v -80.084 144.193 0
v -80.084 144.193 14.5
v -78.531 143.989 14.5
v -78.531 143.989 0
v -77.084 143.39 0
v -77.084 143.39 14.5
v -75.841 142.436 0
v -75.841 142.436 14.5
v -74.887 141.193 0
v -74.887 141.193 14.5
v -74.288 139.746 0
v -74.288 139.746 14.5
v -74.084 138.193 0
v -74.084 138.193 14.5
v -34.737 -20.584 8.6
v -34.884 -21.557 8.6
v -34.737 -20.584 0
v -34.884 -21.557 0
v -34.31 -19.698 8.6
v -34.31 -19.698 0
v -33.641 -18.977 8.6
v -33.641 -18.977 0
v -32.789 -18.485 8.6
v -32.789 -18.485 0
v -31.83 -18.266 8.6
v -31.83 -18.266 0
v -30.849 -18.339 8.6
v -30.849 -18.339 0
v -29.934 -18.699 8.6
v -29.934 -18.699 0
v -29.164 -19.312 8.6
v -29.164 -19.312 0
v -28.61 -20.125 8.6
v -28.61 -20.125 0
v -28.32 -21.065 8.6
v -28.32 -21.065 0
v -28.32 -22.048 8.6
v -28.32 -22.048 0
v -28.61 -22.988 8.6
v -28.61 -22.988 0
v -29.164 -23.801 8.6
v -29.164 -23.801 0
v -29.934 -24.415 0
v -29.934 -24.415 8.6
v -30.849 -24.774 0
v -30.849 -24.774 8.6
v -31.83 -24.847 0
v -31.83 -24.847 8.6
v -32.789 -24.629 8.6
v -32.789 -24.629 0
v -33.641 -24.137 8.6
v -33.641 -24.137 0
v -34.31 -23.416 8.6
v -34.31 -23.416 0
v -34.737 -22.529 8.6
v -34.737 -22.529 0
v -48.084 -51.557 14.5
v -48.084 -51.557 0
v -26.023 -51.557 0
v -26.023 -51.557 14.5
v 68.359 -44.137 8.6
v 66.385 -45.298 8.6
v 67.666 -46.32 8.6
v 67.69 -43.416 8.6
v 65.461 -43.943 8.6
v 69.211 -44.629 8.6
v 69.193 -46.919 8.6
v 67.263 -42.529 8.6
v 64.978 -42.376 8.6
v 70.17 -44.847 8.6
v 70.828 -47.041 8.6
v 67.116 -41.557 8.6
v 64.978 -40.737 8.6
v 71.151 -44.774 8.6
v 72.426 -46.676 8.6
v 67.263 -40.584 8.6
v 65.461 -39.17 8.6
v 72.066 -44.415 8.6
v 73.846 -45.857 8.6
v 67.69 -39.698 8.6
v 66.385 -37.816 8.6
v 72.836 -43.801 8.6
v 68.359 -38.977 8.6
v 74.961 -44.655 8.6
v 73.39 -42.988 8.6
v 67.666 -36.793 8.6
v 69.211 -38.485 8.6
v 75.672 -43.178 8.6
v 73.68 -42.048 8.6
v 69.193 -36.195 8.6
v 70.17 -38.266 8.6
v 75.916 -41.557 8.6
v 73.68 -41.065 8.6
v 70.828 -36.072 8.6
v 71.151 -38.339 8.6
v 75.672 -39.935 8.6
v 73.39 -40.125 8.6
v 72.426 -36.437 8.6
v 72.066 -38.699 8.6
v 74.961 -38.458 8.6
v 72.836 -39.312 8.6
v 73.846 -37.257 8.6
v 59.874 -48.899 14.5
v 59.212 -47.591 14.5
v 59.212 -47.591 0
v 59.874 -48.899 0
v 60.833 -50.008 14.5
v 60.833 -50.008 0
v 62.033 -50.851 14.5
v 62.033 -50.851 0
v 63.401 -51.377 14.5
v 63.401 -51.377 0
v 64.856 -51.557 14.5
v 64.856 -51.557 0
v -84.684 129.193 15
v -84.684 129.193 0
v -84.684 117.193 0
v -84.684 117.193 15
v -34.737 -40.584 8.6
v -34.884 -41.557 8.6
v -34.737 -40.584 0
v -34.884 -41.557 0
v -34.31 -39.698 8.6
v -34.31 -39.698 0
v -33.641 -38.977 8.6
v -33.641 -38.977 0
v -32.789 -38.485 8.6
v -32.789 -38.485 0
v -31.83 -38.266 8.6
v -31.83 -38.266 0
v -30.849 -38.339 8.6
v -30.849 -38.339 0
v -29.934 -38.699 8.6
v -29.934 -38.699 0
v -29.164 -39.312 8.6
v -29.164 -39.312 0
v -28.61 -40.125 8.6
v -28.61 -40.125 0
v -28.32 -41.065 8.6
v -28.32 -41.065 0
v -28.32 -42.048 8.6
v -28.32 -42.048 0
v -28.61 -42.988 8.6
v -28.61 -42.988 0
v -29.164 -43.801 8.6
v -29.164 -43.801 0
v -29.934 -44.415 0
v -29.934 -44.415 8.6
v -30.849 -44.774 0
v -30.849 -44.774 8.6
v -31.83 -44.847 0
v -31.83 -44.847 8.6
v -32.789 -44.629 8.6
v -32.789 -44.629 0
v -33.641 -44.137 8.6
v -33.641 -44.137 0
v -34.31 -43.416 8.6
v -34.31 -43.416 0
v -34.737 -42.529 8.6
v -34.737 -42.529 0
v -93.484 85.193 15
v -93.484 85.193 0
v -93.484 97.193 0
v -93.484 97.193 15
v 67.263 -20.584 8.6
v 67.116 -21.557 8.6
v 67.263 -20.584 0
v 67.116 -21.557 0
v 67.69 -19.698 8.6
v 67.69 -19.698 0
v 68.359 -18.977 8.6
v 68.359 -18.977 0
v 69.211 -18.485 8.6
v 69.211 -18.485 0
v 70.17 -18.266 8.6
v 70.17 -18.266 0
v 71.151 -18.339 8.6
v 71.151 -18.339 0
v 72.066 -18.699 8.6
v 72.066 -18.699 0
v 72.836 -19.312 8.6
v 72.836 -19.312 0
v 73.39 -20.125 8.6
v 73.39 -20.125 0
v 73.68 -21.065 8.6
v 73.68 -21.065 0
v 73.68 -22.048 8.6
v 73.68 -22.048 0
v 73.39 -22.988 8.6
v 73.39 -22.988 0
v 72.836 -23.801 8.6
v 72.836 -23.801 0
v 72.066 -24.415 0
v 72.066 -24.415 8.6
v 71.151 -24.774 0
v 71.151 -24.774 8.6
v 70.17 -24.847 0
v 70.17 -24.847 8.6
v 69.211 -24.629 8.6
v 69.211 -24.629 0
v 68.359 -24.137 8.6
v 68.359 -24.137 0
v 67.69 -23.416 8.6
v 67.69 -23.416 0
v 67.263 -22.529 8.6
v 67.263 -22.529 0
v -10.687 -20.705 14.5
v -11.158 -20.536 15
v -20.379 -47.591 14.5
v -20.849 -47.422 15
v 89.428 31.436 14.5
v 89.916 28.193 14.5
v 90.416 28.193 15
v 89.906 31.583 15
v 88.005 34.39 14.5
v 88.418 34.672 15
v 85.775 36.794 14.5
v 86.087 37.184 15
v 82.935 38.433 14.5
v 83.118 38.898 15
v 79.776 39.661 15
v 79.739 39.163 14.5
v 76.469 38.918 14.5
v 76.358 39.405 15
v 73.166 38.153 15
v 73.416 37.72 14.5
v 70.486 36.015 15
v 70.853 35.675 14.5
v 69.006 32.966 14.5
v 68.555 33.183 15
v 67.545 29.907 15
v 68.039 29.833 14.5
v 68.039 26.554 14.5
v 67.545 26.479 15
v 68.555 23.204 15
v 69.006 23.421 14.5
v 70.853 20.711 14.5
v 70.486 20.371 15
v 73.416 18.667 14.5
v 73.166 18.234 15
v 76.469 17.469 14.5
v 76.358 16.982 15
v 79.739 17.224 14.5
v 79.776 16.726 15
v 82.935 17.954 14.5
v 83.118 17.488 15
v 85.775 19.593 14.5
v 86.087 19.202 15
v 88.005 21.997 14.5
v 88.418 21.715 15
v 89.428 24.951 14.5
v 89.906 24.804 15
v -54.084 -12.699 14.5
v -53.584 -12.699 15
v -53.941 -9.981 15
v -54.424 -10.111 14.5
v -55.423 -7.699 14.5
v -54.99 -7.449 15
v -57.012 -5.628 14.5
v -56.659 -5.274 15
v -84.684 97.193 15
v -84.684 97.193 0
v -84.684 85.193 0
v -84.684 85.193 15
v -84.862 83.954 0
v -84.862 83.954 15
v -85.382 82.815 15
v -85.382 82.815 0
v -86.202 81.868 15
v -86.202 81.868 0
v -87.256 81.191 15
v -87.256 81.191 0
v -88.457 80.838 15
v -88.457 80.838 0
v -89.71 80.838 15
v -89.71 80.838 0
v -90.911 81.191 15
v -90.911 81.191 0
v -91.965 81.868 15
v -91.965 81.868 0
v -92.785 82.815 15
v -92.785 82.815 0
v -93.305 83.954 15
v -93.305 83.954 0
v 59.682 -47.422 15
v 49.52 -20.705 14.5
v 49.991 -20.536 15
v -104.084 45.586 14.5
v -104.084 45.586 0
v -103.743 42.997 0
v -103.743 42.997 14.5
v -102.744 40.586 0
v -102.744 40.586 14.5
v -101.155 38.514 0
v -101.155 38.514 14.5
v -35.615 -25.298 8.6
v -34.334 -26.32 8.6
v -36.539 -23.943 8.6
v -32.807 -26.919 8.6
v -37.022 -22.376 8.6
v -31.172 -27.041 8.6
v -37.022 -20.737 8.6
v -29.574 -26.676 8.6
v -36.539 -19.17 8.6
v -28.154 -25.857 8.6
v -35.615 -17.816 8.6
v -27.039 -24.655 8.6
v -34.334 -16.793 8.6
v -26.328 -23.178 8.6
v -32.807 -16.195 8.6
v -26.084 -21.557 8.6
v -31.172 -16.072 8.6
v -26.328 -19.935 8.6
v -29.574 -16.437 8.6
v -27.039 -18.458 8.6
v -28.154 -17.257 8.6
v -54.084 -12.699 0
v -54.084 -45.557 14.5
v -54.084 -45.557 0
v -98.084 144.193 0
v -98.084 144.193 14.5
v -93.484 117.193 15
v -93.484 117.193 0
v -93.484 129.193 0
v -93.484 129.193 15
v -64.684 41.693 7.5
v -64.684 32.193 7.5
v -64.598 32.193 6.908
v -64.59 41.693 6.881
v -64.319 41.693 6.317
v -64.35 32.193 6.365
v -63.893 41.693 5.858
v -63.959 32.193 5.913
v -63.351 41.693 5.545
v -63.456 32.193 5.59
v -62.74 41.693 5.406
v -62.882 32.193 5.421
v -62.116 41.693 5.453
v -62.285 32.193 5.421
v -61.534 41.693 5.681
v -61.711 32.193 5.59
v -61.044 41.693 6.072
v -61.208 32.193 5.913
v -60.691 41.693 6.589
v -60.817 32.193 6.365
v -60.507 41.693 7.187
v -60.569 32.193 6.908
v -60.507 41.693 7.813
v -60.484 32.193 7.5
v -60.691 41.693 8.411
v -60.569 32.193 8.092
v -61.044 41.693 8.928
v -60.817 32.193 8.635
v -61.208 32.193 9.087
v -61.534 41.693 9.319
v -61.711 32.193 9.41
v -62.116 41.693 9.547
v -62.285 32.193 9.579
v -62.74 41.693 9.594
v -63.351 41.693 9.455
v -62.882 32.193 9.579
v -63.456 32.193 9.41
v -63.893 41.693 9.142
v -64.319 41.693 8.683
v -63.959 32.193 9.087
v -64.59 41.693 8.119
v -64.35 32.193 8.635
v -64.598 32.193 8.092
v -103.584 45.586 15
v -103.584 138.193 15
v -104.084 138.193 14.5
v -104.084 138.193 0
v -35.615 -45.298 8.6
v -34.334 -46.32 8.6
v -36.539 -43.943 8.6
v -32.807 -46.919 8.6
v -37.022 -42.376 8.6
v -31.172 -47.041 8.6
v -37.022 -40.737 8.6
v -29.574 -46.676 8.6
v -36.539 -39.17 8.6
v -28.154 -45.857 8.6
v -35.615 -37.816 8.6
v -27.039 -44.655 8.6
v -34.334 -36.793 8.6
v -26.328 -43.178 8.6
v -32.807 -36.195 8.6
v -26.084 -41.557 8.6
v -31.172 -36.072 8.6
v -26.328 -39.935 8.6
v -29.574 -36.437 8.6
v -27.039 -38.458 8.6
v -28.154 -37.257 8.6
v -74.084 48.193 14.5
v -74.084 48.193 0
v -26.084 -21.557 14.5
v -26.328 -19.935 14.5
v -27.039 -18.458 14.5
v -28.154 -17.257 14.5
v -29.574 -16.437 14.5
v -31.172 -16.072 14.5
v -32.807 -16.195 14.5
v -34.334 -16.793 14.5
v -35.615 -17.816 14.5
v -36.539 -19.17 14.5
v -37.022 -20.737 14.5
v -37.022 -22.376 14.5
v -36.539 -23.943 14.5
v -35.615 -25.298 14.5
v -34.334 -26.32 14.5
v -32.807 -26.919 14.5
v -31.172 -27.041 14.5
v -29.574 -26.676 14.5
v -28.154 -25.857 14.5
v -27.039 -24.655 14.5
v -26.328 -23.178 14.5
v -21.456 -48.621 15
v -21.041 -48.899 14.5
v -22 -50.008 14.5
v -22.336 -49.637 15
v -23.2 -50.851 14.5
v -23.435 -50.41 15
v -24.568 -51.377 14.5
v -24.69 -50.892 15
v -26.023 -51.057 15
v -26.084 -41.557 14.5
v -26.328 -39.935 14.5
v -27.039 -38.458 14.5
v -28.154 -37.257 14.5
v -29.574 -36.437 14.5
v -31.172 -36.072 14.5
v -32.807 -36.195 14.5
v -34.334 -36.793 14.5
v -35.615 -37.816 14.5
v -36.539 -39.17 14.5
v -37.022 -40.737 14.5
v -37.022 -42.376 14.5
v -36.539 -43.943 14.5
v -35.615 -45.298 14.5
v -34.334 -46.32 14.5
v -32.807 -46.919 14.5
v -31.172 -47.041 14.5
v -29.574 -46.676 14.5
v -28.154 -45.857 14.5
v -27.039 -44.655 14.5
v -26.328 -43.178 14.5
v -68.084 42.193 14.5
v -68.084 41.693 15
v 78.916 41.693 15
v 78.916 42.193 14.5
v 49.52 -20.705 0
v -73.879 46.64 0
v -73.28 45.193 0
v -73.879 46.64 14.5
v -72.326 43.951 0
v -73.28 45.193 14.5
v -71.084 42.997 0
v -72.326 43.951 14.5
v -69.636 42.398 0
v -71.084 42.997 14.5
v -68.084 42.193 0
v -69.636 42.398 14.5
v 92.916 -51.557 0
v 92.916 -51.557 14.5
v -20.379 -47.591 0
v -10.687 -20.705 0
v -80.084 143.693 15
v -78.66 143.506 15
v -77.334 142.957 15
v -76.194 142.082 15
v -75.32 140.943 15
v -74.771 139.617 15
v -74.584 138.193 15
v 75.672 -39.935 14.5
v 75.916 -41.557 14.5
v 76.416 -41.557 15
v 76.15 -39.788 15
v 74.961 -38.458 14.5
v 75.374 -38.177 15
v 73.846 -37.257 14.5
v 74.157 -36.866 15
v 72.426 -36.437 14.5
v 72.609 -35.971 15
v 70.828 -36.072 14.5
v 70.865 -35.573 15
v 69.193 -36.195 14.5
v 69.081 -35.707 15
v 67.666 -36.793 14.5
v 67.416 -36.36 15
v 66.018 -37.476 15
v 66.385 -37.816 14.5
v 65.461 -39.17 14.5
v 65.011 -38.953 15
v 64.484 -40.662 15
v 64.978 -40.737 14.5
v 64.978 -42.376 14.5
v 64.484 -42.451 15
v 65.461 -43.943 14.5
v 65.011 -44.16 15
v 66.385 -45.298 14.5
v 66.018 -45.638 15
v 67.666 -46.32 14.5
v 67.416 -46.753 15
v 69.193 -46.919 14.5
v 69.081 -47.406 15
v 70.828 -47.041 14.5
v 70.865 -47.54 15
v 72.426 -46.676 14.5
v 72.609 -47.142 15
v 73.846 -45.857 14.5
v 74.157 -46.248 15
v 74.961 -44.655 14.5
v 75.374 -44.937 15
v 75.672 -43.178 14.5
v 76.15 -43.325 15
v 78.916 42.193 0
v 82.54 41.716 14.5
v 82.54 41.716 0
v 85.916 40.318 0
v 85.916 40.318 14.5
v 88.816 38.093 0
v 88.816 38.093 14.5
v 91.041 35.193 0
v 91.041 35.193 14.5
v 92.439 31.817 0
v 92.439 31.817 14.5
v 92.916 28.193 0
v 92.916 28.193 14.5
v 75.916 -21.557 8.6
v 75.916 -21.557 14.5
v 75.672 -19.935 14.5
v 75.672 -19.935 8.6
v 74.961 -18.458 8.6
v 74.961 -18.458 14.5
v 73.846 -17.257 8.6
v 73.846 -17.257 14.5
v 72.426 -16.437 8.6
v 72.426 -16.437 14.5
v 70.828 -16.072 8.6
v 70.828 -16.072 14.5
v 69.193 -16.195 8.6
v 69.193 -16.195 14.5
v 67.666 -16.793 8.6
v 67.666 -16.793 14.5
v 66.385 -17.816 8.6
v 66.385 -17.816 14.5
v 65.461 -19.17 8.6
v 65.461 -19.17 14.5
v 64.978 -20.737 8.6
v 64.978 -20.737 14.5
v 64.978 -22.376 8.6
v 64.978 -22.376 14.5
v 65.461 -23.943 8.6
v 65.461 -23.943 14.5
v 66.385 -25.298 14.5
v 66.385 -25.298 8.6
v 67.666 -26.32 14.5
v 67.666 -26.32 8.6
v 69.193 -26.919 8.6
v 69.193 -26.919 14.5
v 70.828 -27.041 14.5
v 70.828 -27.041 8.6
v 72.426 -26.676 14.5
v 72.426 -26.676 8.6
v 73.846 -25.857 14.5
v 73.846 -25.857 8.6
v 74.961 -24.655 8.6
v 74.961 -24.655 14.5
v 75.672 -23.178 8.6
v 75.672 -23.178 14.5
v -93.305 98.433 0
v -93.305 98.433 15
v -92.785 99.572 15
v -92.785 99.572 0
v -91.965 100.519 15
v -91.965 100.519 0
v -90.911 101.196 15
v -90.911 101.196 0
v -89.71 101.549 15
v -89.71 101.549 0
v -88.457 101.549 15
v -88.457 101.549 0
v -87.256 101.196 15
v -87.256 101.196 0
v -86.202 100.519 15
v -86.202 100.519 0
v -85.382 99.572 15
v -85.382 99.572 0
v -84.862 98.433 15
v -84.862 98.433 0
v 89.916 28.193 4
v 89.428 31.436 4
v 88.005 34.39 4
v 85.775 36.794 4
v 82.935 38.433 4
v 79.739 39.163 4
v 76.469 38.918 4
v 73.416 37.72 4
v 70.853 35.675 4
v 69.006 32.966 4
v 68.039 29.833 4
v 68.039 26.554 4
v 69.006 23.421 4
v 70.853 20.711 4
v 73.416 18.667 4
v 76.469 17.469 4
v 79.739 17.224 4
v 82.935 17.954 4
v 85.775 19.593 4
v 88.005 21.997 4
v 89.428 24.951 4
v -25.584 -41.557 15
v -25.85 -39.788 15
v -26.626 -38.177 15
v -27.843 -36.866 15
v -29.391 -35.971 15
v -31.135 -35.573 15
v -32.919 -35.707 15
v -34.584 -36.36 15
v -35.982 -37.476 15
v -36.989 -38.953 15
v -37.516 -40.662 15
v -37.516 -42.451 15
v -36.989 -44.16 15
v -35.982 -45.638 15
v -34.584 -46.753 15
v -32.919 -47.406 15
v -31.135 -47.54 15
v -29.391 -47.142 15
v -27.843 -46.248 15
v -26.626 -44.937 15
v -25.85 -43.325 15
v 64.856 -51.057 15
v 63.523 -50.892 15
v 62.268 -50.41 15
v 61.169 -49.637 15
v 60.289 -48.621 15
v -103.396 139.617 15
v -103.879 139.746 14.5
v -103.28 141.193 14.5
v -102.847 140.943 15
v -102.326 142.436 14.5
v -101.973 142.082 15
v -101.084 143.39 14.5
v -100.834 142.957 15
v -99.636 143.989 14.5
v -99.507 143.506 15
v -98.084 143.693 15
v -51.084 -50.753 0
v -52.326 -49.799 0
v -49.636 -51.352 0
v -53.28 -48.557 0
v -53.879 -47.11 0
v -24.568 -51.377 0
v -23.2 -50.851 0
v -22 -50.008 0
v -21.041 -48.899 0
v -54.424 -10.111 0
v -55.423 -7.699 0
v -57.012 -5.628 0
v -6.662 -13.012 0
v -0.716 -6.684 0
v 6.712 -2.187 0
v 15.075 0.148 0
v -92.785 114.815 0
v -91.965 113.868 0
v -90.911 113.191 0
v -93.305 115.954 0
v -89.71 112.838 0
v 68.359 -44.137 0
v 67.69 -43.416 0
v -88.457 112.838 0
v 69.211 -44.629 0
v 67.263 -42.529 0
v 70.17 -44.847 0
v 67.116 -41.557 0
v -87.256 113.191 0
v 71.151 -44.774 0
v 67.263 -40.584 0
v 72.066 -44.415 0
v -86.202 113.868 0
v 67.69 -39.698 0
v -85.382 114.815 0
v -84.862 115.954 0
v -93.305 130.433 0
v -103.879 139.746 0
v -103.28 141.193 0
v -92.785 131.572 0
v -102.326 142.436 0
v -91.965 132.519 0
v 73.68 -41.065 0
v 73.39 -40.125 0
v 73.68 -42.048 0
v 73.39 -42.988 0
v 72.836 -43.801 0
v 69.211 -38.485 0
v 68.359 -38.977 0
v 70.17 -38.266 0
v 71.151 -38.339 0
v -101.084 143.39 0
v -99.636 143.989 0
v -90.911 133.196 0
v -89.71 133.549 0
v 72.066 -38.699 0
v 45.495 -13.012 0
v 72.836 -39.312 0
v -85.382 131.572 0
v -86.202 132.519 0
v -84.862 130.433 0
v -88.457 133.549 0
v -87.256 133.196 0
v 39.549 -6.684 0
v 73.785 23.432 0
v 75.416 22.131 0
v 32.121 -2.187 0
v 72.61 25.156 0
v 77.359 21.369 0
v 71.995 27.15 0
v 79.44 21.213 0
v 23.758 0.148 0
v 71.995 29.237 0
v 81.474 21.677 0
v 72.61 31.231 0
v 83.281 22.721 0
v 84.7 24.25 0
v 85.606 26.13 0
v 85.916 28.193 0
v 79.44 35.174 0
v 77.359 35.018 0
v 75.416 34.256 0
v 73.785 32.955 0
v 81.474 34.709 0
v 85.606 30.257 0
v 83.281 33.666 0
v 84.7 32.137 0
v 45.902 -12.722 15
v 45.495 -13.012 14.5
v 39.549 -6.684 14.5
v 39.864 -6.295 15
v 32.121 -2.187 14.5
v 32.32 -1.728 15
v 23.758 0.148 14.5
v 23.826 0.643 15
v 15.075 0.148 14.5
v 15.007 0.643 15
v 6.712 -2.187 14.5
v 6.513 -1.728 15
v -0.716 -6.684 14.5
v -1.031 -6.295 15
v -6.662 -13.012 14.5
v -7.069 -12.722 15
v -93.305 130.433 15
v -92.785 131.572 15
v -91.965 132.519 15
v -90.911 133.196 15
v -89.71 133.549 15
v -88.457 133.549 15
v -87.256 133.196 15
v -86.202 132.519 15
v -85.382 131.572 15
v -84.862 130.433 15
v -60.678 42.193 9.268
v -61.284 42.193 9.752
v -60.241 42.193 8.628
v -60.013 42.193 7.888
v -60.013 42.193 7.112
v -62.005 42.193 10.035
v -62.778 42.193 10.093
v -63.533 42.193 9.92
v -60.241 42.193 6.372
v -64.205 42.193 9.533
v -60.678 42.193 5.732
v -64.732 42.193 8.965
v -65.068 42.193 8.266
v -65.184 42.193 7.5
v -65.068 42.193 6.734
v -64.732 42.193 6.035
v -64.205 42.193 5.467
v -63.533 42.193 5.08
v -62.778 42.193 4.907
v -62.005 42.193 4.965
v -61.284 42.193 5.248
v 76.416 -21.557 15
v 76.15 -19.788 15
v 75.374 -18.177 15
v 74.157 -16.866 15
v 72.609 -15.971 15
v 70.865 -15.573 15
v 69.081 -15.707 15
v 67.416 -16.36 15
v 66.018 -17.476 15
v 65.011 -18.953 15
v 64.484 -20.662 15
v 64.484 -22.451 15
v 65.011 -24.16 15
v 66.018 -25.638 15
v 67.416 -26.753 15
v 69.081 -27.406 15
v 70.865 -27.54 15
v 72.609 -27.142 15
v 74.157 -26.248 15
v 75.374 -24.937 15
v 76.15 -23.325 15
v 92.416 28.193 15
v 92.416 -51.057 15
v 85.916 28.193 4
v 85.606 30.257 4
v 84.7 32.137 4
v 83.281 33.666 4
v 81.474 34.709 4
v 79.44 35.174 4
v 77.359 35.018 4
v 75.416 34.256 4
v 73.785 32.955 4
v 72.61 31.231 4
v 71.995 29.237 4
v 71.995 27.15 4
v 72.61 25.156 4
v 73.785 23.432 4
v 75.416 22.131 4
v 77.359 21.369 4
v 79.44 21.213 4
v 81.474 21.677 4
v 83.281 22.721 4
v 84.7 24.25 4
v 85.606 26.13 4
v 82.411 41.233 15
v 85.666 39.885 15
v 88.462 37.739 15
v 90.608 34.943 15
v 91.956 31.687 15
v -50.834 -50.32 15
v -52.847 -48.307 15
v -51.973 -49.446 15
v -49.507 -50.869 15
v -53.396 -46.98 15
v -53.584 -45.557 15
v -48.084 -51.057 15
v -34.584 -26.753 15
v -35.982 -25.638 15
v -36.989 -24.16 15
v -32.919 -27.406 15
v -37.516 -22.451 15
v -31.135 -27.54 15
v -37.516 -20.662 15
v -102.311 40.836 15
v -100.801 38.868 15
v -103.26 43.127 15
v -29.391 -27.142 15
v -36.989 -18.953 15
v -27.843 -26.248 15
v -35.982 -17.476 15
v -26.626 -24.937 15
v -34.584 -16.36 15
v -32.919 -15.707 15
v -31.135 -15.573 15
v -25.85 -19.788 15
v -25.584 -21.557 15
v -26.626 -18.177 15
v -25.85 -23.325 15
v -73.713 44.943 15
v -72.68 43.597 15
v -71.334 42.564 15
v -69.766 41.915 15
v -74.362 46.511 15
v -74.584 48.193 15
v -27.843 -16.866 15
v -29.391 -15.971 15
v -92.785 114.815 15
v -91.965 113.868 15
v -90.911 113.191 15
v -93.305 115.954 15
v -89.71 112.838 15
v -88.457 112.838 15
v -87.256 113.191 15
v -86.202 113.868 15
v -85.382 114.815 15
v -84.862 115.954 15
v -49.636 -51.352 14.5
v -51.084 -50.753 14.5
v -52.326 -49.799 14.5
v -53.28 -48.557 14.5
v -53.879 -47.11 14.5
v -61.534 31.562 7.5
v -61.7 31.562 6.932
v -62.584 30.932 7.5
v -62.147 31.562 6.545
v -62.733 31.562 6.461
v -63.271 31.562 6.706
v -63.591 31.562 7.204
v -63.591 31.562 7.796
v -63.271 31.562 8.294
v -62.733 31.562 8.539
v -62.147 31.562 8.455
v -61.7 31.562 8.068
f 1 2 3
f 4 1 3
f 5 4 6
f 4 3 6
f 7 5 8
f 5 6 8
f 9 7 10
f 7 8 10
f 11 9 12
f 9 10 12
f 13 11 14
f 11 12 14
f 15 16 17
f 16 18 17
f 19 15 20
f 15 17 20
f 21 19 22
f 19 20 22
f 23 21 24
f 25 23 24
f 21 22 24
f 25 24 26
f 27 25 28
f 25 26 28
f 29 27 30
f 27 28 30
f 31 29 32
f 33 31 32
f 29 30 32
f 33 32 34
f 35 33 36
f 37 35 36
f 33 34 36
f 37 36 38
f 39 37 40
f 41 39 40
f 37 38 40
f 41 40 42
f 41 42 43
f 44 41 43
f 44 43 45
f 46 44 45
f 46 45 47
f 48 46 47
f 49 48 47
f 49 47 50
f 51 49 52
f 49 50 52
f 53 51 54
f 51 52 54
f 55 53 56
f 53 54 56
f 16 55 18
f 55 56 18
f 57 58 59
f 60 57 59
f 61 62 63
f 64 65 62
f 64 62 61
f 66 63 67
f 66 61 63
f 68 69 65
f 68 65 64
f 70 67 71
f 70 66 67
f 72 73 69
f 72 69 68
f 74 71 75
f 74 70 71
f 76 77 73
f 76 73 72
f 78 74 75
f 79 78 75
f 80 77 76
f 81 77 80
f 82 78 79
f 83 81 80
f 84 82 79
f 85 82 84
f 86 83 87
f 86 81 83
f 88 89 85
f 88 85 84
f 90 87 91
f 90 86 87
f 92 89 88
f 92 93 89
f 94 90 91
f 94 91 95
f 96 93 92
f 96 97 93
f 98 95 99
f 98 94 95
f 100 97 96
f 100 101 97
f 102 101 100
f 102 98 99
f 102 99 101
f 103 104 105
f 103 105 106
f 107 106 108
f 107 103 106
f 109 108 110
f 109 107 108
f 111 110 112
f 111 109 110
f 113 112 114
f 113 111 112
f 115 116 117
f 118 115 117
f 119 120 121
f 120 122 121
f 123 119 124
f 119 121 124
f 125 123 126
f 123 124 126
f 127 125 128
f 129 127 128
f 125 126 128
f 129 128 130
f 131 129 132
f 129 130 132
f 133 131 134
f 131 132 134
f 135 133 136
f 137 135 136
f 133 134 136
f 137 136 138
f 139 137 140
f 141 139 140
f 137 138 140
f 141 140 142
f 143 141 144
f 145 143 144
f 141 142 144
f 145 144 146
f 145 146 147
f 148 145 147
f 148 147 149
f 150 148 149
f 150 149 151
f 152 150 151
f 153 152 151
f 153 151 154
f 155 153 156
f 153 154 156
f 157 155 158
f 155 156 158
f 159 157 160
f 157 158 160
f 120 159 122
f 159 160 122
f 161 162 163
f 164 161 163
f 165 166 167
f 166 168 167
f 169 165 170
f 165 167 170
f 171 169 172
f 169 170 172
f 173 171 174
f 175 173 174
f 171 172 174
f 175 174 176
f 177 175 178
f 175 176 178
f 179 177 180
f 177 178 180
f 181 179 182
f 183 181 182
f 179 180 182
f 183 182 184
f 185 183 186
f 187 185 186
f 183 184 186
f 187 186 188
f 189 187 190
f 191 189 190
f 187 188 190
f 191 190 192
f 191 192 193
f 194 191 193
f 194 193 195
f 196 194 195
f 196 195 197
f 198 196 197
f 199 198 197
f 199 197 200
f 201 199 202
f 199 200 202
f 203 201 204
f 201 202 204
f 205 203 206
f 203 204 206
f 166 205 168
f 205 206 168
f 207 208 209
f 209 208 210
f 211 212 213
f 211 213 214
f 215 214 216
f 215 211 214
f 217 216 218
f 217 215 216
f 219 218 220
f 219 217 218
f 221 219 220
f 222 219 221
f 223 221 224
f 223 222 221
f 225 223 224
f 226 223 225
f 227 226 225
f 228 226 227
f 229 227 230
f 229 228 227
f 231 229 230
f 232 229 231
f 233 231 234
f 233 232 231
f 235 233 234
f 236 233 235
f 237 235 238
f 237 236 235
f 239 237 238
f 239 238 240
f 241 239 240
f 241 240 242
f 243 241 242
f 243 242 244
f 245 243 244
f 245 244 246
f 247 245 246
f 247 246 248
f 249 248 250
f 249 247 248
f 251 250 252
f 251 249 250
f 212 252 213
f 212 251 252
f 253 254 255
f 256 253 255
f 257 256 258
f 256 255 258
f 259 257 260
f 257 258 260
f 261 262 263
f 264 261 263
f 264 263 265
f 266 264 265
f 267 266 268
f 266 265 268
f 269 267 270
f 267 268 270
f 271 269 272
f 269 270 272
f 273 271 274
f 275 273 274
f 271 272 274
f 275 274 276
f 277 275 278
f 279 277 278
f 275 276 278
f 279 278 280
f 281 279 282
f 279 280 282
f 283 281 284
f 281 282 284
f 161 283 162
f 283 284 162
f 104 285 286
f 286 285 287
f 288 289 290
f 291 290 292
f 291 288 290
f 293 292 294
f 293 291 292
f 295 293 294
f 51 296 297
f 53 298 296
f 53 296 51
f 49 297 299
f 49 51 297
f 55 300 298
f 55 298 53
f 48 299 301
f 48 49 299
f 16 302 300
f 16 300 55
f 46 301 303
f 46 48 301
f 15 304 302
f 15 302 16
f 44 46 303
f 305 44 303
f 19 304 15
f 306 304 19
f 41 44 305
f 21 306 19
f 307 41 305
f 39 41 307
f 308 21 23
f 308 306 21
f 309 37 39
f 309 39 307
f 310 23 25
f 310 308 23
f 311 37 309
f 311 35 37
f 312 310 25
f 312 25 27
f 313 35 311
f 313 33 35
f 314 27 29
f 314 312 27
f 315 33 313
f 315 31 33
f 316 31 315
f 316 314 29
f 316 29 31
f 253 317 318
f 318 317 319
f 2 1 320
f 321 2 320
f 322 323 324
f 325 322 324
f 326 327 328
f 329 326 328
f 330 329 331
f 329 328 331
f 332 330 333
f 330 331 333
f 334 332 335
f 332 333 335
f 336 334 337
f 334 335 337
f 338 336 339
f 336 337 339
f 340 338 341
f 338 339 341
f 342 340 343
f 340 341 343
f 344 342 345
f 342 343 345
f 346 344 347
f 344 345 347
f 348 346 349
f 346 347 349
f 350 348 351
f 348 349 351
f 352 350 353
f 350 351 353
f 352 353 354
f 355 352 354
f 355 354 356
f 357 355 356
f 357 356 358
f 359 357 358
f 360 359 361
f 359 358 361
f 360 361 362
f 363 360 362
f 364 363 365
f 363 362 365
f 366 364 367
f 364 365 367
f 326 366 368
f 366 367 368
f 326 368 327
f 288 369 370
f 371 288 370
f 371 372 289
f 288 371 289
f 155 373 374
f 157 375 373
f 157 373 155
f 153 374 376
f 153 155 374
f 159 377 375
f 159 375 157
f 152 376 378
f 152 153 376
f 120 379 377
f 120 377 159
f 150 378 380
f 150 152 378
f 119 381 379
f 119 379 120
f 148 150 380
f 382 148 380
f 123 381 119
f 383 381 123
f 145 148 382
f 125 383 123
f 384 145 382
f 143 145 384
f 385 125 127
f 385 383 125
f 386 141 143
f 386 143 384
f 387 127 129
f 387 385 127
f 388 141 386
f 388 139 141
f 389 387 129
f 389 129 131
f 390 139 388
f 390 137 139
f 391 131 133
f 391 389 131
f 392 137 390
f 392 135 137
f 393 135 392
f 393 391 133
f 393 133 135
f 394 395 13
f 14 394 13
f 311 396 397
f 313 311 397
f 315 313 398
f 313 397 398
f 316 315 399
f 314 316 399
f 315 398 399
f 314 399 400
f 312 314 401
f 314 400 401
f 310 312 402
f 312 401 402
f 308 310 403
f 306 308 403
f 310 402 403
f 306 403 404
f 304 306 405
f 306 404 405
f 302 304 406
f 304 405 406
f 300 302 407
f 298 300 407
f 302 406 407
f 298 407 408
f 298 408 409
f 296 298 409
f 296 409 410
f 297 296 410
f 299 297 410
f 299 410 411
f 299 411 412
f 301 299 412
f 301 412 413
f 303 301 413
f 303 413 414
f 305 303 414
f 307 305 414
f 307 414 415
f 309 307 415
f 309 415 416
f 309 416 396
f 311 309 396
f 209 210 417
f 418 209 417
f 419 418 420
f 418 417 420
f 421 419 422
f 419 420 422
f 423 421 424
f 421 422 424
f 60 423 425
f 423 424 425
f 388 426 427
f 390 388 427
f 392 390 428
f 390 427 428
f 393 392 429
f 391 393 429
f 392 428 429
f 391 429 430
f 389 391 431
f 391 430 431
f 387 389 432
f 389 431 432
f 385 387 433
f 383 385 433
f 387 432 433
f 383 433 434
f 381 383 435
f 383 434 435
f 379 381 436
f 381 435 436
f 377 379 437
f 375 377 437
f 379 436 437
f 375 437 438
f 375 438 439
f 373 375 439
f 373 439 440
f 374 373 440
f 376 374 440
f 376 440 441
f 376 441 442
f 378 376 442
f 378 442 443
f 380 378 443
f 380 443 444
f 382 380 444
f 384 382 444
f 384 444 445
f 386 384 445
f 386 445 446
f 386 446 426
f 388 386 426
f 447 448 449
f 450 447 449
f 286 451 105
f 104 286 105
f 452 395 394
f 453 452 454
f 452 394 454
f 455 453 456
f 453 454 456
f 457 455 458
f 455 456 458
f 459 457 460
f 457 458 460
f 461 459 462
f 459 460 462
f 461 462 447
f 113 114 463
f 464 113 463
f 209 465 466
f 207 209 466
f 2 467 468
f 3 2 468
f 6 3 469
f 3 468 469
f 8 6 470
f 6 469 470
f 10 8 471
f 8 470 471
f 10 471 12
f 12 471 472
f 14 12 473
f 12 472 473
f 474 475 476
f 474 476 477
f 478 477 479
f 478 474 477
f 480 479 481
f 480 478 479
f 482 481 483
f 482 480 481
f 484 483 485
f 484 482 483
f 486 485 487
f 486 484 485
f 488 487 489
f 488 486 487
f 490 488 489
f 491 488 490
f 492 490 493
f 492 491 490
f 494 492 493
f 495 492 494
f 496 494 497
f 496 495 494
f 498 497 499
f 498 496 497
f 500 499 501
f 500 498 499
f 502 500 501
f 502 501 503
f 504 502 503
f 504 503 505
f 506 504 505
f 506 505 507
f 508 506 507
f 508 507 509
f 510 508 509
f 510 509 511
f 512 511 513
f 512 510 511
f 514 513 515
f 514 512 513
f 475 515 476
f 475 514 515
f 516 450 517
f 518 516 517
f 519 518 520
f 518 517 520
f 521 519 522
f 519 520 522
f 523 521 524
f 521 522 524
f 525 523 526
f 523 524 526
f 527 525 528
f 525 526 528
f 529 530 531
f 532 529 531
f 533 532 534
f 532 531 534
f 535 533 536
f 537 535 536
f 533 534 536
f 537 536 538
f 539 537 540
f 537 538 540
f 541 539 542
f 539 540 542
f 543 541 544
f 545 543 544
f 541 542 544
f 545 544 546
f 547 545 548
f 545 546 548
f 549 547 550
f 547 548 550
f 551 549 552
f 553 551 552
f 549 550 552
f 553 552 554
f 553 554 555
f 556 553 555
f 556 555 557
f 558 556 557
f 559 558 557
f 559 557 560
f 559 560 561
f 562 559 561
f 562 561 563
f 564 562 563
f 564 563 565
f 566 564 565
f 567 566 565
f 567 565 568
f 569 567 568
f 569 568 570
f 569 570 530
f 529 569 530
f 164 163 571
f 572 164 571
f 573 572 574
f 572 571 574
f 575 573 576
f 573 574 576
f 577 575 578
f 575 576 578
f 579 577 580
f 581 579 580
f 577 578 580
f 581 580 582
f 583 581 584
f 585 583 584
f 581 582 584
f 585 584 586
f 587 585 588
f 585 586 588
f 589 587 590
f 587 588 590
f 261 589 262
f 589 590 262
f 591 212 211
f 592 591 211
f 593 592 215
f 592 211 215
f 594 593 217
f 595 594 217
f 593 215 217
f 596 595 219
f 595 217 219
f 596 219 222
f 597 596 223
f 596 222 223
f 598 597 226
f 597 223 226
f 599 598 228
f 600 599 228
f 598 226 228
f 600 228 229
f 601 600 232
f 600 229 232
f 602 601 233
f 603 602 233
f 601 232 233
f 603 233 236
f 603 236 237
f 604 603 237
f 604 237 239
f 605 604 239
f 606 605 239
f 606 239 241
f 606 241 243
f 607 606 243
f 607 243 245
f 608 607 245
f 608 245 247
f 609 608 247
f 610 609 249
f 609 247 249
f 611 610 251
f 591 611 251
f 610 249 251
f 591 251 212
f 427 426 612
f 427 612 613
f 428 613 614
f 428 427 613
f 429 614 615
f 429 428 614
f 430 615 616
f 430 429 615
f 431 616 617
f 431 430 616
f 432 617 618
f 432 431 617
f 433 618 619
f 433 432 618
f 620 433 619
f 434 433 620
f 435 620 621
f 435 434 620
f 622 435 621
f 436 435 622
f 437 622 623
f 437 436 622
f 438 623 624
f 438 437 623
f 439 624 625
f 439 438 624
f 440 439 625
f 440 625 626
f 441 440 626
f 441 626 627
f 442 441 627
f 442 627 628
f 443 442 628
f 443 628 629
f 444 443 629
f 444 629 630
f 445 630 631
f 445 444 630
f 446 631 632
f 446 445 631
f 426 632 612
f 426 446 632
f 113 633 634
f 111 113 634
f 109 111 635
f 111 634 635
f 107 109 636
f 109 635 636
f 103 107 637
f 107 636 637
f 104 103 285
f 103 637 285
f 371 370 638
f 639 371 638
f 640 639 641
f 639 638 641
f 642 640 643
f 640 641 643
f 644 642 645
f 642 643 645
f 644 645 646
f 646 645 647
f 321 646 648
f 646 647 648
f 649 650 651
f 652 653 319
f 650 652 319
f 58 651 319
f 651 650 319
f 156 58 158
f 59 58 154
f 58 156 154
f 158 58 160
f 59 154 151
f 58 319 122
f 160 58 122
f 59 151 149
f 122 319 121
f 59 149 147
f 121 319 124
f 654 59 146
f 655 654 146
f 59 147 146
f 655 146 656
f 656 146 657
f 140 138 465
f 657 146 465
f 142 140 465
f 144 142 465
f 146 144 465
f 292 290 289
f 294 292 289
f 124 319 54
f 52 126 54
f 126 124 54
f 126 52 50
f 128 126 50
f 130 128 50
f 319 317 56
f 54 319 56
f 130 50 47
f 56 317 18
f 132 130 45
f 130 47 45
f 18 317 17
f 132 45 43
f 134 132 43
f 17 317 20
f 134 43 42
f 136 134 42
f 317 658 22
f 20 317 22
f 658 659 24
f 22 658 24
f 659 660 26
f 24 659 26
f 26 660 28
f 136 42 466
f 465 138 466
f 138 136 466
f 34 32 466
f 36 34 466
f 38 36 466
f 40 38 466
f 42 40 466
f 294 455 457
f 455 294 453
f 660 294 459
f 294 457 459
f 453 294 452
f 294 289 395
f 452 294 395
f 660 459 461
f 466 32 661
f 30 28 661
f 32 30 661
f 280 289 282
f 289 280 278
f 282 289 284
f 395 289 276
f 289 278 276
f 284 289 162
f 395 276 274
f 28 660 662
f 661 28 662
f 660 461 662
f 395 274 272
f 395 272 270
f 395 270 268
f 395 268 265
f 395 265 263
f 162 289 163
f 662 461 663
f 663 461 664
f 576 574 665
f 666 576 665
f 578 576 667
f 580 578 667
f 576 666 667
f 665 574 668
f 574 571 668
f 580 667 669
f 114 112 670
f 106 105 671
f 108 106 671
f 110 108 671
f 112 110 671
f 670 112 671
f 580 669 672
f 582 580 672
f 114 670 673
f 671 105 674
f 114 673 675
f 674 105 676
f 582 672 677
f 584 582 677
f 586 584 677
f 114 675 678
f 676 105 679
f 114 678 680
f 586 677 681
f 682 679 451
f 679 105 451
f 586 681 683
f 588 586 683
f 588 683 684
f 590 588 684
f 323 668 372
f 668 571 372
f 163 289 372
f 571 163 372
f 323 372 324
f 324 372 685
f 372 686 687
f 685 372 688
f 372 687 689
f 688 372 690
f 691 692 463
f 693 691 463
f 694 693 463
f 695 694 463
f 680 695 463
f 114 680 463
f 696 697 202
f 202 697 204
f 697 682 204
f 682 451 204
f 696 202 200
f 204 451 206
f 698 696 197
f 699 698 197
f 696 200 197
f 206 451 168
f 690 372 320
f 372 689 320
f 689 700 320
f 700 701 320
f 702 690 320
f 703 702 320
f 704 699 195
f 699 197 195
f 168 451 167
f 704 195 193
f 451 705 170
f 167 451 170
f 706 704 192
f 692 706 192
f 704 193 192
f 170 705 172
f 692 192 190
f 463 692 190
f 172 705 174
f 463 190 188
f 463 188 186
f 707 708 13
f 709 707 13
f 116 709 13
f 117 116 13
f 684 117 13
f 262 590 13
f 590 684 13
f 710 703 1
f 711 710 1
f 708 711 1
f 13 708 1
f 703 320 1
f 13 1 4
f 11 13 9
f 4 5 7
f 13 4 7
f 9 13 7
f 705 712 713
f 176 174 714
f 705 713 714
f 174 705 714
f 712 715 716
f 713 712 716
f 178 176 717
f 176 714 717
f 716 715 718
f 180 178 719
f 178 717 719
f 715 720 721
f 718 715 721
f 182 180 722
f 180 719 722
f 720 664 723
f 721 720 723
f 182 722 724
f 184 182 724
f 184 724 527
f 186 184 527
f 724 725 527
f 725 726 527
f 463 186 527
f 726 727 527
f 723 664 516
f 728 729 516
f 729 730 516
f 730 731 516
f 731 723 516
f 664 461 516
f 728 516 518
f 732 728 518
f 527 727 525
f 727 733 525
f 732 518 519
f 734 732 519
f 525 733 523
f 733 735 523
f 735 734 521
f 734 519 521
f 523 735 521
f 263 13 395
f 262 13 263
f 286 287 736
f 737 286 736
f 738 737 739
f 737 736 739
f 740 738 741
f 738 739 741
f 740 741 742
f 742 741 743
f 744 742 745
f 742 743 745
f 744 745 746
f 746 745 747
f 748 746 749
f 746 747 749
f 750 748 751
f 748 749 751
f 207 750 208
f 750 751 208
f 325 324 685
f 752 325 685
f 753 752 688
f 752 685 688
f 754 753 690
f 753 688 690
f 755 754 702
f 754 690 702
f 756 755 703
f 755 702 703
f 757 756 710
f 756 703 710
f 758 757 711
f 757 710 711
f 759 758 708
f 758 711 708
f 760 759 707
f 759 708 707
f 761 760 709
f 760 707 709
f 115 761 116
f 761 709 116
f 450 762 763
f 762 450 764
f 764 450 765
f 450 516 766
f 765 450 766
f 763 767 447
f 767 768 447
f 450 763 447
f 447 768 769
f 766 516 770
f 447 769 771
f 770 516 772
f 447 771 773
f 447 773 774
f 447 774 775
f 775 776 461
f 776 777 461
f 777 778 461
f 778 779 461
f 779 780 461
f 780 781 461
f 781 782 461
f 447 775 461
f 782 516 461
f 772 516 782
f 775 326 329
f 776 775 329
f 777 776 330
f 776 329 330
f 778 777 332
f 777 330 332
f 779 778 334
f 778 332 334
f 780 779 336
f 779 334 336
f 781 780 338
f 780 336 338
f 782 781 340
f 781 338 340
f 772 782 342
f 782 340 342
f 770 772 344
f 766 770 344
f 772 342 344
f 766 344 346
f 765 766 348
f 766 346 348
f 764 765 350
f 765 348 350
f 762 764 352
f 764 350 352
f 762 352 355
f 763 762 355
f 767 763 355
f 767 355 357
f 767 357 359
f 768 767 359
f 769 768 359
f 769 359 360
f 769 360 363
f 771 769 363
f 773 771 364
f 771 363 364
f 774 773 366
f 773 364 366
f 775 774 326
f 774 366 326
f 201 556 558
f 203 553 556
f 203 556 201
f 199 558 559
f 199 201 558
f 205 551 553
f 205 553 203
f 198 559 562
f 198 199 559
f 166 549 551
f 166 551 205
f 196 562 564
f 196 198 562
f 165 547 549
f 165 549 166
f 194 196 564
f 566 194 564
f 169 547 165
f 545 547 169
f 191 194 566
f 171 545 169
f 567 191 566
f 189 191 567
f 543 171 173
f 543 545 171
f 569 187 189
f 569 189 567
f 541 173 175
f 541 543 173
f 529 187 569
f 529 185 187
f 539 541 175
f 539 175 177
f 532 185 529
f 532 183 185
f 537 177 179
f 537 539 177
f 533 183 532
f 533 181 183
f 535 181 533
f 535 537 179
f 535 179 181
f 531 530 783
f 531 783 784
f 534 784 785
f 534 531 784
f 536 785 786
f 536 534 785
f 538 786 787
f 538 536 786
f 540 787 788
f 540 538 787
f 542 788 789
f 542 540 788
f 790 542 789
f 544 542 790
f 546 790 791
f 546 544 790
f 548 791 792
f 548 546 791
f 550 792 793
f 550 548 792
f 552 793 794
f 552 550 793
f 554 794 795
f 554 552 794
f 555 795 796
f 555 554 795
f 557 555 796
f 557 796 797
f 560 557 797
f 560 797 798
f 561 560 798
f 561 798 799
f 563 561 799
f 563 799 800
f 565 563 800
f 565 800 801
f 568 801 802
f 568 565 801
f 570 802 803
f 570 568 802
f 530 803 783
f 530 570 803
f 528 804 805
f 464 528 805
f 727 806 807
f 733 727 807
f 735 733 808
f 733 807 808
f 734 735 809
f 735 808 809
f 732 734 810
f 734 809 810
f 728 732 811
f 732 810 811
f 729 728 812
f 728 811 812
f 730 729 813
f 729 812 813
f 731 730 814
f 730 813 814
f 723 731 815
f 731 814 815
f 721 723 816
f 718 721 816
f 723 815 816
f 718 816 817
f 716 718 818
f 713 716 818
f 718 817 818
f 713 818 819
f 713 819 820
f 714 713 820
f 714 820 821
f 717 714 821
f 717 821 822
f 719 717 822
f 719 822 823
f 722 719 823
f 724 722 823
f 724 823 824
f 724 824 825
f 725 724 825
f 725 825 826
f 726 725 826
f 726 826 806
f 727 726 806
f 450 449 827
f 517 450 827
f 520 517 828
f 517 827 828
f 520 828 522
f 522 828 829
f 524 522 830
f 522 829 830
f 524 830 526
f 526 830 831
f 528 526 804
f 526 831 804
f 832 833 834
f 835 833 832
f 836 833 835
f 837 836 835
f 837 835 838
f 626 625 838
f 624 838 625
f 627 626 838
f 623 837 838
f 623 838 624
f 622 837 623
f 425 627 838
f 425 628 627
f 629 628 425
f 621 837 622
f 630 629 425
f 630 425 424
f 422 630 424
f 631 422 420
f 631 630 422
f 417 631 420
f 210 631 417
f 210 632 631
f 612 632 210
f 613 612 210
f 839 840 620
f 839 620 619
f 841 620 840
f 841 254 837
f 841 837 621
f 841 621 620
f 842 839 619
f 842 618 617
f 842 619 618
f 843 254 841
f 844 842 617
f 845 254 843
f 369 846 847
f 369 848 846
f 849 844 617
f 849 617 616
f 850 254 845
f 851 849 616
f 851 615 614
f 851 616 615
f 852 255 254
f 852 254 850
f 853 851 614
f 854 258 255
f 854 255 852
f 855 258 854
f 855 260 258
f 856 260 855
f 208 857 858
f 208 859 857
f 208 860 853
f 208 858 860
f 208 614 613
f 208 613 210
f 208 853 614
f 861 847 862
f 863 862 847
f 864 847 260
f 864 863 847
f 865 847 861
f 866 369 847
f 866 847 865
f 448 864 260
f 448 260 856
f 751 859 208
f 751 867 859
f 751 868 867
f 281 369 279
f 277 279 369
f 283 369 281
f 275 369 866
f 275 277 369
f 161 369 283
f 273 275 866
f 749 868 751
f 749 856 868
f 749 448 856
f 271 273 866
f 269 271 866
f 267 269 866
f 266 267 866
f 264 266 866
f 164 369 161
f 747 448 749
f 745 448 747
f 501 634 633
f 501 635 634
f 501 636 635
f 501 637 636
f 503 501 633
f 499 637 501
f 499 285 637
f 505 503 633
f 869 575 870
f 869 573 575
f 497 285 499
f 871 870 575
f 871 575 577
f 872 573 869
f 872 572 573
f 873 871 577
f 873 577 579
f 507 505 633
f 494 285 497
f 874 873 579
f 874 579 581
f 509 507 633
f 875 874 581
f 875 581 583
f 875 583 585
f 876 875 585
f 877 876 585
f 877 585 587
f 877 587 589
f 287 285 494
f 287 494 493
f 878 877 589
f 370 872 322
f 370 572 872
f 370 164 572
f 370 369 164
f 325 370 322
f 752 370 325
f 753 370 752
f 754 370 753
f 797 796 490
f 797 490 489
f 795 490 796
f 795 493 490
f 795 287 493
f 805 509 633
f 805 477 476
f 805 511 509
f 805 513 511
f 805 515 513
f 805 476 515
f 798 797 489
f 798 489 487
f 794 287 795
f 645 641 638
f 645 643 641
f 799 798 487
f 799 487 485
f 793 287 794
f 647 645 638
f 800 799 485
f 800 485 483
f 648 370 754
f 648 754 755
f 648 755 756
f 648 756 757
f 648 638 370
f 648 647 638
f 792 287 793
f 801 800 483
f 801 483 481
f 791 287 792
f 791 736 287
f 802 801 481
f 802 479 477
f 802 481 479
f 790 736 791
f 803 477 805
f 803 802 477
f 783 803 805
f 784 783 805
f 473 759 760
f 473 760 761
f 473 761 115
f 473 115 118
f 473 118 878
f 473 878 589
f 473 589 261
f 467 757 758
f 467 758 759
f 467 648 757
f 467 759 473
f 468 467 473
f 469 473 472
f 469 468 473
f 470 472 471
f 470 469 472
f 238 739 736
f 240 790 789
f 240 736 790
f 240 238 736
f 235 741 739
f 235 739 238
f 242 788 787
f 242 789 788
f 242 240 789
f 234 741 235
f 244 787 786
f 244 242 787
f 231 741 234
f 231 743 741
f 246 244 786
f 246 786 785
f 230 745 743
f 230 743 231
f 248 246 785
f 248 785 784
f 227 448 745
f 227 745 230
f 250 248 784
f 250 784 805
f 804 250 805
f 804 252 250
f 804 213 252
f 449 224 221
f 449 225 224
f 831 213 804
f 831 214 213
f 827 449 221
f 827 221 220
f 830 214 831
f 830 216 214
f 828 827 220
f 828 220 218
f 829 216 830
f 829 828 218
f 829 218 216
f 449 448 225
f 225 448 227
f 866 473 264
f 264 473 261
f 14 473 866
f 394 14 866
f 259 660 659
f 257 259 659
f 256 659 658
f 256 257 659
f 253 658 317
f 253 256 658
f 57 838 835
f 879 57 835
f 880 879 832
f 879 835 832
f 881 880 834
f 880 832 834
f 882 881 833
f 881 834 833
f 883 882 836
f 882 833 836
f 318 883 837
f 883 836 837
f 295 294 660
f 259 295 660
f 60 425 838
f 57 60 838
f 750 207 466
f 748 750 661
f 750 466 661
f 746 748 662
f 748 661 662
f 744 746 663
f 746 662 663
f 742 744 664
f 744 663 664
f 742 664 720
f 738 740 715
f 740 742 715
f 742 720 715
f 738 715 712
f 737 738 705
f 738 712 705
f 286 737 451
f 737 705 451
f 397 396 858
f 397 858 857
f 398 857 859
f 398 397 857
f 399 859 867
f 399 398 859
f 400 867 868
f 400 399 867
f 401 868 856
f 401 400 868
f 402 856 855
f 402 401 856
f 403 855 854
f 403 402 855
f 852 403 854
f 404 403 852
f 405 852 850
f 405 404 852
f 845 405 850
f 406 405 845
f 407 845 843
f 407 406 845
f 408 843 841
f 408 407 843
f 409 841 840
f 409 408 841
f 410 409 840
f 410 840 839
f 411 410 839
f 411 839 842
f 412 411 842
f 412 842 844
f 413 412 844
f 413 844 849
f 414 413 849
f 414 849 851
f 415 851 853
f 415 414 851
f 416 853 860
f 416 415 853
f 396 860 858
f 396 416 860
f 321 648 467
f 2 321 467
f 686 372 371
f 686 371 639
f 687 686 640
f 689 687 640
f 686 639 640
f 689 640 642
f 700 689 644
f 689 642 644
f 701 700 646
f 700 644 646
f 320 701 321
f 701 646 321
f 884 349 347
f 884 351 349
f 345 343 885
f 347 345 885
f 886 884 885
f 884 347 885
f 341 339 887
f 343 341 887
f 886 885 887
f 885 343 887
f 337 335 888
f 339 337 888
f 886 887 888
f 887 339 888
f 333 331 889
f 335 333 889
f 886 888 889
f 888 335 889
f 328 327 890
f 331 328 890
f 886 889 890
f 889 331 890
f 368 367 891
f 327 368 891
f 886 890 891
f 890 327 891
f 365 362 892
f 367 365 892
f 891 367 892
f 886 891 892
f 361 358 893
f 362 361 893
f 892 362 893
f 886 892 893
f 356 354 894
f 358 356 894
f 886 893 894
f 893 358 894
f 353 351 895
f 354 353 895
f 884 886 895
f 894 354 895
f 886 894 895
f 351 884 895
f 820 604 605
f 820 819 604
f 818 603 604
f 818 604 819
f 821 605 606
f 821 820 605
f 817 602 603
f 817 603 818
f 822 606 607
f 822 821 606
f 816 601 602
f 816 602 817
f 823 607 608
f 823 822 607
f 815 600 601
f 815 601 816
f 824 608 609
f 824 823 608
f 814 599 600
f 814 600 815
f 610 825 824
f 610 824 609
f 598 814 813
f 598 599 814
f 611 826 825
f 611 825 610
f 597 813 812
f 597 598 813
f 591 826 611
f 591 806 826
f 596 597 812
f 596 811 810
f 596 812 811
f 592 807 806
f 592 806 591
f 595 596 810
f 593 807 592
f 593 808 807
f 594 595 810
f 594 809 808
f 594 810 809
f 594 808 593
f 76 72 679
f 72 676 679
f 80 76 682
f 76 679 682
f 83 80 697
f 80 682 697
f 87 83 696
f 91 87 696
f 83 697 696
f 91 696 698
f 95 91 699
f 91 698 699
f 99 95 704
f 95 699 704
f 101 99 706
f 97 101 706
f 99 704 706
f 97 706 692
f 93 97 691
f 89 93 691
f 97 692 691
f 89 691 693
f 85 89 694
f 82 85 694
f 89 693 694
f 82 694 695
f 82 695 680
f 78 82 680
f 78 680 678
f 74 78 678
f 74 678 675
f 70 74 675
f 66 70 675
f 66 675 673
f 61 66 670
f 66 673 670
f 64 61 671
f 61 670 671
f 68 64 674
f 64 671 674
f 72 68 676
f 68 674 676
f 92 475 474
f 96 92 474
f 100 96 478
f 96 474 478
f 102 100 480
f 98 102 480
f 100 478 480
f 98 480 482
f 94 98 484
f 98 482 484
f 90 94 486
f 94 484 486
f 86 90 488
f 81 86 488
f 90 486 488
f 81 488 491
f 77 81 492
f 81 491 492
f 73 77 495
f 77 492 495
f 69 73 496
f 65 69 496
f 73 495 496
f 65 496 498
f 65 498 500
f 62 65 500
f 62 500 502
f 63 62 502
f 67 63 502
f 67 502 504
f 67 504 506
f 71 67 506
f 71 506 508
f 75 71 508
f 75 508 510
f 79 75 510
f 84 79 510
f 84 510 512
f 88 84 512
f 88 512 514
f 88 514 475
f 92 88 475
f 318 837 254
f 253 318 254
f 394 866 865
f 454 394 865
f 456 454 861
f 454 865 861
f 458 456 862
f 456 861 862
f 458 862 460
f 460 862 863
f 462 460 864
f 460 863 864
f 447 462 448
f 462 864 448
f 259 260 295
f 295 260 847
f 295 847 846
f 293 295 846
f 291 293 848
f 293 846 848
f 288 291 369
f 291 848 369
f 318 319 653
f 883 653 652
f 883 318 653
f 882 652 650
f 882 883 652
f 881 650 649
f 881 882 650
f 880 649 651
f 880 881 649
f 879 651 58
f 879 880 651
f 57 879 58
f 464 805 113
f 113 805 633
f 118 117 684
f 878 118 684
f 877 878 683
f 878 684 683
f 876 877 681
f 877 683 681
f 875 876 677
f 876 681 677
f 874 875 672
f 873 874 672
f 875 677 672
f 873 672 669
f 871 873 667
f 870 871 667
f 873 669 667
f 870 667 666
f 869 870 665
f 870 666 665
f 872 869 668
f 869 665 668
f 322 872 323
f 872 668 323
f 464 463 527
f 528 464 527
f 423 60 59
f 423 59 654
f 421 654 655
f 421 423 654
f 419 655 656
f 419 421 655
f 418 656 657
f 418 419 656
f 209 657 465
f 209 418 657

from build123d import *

# Parameters (mm, degrees)
BOSS_EXTRUDE1_DEPTH                                 = 15
FILLET1_R                                           = 6
CBORE_FOR_M6_HEX_SOCKET_HEAD_CAP_SCREW1_D           = 6.6
CBORE_FOR_M6_HEX_SOCKET_HEAD_CAP_SCREW1_CBORE_D     = 11
CBORE_FOR_M6_HEX_SOCKET_HEAD_CAP_SCREW1_CBORE_DEPTH = 6.4
SKETCH6_R                                           = 7
CUT_EXTRUDE3_DEPTH                                  = 16
SKETCH7_R                                           = 11
CUT_EXTRUDE4_DEPTH                                  = 11
TAP_DRILL_FOR_M5_TAP1_D                             = 4.2
TAP_DRILL_FOR_M5_TAP1_DEPTH                         = 10
TAP_DRILL_FOR_M5_TAP1_TIP                           = 1.2618073
FILLET4_R                                           = 14
FILLET5_R                                           = 10
CHAMFER1_SIZE                                       = 0.5


with BuildPart() as part:
    # Sketch1 → Boss-Extrude1 (new body)
    with BuildSketch(Plane.XY):
        with BuildLine():
            Line((-54.083500753, -8.556617627), (-54.083500753, -51.556617627))
            Line((-54.083500753, -51.556617627), (-21.808305332, -51.556617627))
            Line((-21.808305332, -51.556617627), (-10.687429148, -20.70518937))
            ThreePointArc((-10.687429148, -20.70518937), (19.416499247, 0.443382373), (49.520427642, -20.70518937))
            Line((49.520427642, -20.70518937), (60.641303826, -51.556617627))
            Line((60.641303826, -51.556617627), (92.916499247, -51.556617627))
            Line((92.916499247, -51.556617627), (92.916499247, 42.193382373))
            Line((92.916499247, 42.193382373), (-74.083500753, 42.193382373))
            Line((-74.083500753, 42.193382373), (-74.083500753, 144.193382373))
            Line((-74.083500753, 144.193382373), (-104.083500753, 144.193382373))
            Line((-104.083500753, 144.193382373), (-104.083500753, 41.443382373))
            Line((-104.083500753, 41.443382373), (-54.083500753, -8.556617627))
        make_face()
        with BuildLine():
            ThreePointArc((-93.483500753, 97.193382373), (-89.083500753, 101.593382373), (-84.683500753, 97.193382373))
            Line((-84.683500753, 97.193382373), (-84.683500753, 85.193382373))
            ThreePointArc((-84.683500753, 85.193382373), (-89.083500753, 80.793382373), (-93.483500753, 85.193382373))
            Line((-93.483500753, 85.193382373), (-93.483500753, 97.193382373))
        make_face(mode=Mode.SUBTRACT)
        with BuildLine():
            ThreePointArc((-93.483500753, 129.193382373), (-89.083500753, 133.593382373), (-84.683500753, 129.193382373))
            Line((-84.683500753, 129.193382373), (-84.683500753, 117.193382373))
            ThreePointArc((-84.683500753, 117.193382373), (-89.083500753, 112.793382373), (-93.483500753, 117.193382373))
            Line((-93.483500753, 117.193382373), (-93.483500753, 129.193382373))
        make_face(mode=Mode.SUBTRACT)
    extrude(amount=BOSS_EXTRUDE1_DEPTH)

    # Fillet1
    fillet1_edges = [part.edges().sort_by_distance(p)[0] for p in [
        (-21.808305332, -51.556617627, 7.5),
        (-54.083500753, -51.556617627, 7.5),
        (-104.083500753, 144.193382373, 7.5),
        (-74.083500753, 144.193382373, 7.5),
        (-74.083500753, 42.193382373, 7.5),
        (60.641303826, -51.556617627, 7.5),
    ]]
    fillet(fillet1_edges, radius=FILLET1_R)

    # CBORE for M6 Hex Socket Head Cap Screw1 (through all)
    with Locations(Plane.XY.offset(15)):
        with Locations((-31.583500753, -41.556617627), (-31.583500753, -21.556617627), (70.416499247, -41.556617627), (70.416499247, -21.556617627)):
            CounterBoreHole(CBORE_FOR_M6_HEX_SOCKET_HEAD_CAP_SCREW1_D / 2, CBORE_FOR_M6_HEX_SOCKET_HEAD_CAP_SCREW1_CBORE_D / 2, CBORE_FOR_M6_HEX_SOCKET_HEAD_CAP_SCREW1_CBORE_DEPTH)

    # Sketch6 → Cut-Extrude3 (cut, through all)
    with BuildSketch(Plane.XY.offset(15)):
        with Locations((78.916499247, 28.193382373)):
            Circle(SKETCH6_R)
    extrude(amount=-CUT_EXTRUDE3_DEPTH, mode=Mode.SUBTRACT)

    # Sketch7 → Cut-Extrude4 (cut)
    with BuildSketch(Plane.XY.offset(15)):
        with Locations((78.916499247, 28.193382373)):
            Circle(SKETCH7_R)
    extrude(amount=-CUT_EXTRUDE4_DEPTH, mode=Mode.SUBTRACT)

    # Tap Drill for M5 Tap1
    with Locations(Plane(origin=(0, 42.193382373, 0), x_dir=(1, 0, 0), z_dir=(0, 1, 0))):
        with Locations((-62.583500753, -7.5)):
            Hole(TAP_DRILL_FOR_M5_TAP1_D / 2, depth=TAP_DRILL_FOR_M5_TAP1_DEPTH)
            with Locations((0, 0, -(TAP_DRILL_FOR_M5_TAP1_DEPTH + TAP_DRILL_FOR_M5_TAP1_TIP / 2))):  # 118° drill point
                Cone(0, TAP_DRILL_FOR_M5_TAP1_D / 2, TAP_DRILL_FOR_M5_TAP1_TIP, mode=Mode.SUBTRACT)

    # Fillet4
    fillet4_edges = [part.edges().sort_by_distance(p)[0] for p in [
        (92.916499247, 42.193382373, 7.5),
    ]]
    fillet(fillet4_edges, radius=FILLET4_R)

    # Fillet5
    fillet5_edges = [part.edges().sort_by_distance(p)[0] for p in [
        (-54.083500753, -8.556617627, 7.5),
        (-104.083500753, 41.443382373, 7.5),
    ]]
    fillet(fillet5_edges, radius=FILLET5_R)

    # Chamfer1
    chamfer1_edges = [part.edges().sort_by_distance(p)[0] for p in [
        (64.916499247, -41.556617627, 15),
        (-37.083500753, -21.556617627, 15),
        (-37.083500753, -41.556617627, 15),
        (67.916499247, 28.193382373, 15),
        (-60.483500753, 42.193382373, 7.5),
        (88.815994184, 38.09287731, 15),
        (-79.083500753, 16.443382373, 15),
        (-104.083500753, 91.889450185, 15),
        (-103.322296078, 41.758683673, 15),
        (-54.844705428, -8.871918927, 15),
        (19.416499247, 0.443382373, 15),
        (54.366178458, -34.148224897, 15),
        (92.916499247, -11.681617627, 15),
        (-74.083500753, 93.193382373, 15),
        (5.416499247, 42.193382373, 15),
        (-89.083500753, 144.193382373, 15),
        (78.886457547, -51.556617627, 15),
        (-54.083500753, -29.127685439, 15),
        (-37.053459053, -51.556617627, 15),
        (-22.574349131, -50.466192801, 15),
        (61.407347625, -50.466192801, 15),
        (-52.32614144, -49.799258314, 15),
        (-102.32614144, 142.43602306, 15),
        (-75.840860066, 142.43602306, 15),
        (-72.32614144, 43.950741686, 15),
        (-15.533179964, -34.148224897, 15),
        (64.916499247, -21.556617627, 15),
    ]]
    chamfer(chamfer1_edges, length=CHAMFER1_SIZE)


solid = part.part
